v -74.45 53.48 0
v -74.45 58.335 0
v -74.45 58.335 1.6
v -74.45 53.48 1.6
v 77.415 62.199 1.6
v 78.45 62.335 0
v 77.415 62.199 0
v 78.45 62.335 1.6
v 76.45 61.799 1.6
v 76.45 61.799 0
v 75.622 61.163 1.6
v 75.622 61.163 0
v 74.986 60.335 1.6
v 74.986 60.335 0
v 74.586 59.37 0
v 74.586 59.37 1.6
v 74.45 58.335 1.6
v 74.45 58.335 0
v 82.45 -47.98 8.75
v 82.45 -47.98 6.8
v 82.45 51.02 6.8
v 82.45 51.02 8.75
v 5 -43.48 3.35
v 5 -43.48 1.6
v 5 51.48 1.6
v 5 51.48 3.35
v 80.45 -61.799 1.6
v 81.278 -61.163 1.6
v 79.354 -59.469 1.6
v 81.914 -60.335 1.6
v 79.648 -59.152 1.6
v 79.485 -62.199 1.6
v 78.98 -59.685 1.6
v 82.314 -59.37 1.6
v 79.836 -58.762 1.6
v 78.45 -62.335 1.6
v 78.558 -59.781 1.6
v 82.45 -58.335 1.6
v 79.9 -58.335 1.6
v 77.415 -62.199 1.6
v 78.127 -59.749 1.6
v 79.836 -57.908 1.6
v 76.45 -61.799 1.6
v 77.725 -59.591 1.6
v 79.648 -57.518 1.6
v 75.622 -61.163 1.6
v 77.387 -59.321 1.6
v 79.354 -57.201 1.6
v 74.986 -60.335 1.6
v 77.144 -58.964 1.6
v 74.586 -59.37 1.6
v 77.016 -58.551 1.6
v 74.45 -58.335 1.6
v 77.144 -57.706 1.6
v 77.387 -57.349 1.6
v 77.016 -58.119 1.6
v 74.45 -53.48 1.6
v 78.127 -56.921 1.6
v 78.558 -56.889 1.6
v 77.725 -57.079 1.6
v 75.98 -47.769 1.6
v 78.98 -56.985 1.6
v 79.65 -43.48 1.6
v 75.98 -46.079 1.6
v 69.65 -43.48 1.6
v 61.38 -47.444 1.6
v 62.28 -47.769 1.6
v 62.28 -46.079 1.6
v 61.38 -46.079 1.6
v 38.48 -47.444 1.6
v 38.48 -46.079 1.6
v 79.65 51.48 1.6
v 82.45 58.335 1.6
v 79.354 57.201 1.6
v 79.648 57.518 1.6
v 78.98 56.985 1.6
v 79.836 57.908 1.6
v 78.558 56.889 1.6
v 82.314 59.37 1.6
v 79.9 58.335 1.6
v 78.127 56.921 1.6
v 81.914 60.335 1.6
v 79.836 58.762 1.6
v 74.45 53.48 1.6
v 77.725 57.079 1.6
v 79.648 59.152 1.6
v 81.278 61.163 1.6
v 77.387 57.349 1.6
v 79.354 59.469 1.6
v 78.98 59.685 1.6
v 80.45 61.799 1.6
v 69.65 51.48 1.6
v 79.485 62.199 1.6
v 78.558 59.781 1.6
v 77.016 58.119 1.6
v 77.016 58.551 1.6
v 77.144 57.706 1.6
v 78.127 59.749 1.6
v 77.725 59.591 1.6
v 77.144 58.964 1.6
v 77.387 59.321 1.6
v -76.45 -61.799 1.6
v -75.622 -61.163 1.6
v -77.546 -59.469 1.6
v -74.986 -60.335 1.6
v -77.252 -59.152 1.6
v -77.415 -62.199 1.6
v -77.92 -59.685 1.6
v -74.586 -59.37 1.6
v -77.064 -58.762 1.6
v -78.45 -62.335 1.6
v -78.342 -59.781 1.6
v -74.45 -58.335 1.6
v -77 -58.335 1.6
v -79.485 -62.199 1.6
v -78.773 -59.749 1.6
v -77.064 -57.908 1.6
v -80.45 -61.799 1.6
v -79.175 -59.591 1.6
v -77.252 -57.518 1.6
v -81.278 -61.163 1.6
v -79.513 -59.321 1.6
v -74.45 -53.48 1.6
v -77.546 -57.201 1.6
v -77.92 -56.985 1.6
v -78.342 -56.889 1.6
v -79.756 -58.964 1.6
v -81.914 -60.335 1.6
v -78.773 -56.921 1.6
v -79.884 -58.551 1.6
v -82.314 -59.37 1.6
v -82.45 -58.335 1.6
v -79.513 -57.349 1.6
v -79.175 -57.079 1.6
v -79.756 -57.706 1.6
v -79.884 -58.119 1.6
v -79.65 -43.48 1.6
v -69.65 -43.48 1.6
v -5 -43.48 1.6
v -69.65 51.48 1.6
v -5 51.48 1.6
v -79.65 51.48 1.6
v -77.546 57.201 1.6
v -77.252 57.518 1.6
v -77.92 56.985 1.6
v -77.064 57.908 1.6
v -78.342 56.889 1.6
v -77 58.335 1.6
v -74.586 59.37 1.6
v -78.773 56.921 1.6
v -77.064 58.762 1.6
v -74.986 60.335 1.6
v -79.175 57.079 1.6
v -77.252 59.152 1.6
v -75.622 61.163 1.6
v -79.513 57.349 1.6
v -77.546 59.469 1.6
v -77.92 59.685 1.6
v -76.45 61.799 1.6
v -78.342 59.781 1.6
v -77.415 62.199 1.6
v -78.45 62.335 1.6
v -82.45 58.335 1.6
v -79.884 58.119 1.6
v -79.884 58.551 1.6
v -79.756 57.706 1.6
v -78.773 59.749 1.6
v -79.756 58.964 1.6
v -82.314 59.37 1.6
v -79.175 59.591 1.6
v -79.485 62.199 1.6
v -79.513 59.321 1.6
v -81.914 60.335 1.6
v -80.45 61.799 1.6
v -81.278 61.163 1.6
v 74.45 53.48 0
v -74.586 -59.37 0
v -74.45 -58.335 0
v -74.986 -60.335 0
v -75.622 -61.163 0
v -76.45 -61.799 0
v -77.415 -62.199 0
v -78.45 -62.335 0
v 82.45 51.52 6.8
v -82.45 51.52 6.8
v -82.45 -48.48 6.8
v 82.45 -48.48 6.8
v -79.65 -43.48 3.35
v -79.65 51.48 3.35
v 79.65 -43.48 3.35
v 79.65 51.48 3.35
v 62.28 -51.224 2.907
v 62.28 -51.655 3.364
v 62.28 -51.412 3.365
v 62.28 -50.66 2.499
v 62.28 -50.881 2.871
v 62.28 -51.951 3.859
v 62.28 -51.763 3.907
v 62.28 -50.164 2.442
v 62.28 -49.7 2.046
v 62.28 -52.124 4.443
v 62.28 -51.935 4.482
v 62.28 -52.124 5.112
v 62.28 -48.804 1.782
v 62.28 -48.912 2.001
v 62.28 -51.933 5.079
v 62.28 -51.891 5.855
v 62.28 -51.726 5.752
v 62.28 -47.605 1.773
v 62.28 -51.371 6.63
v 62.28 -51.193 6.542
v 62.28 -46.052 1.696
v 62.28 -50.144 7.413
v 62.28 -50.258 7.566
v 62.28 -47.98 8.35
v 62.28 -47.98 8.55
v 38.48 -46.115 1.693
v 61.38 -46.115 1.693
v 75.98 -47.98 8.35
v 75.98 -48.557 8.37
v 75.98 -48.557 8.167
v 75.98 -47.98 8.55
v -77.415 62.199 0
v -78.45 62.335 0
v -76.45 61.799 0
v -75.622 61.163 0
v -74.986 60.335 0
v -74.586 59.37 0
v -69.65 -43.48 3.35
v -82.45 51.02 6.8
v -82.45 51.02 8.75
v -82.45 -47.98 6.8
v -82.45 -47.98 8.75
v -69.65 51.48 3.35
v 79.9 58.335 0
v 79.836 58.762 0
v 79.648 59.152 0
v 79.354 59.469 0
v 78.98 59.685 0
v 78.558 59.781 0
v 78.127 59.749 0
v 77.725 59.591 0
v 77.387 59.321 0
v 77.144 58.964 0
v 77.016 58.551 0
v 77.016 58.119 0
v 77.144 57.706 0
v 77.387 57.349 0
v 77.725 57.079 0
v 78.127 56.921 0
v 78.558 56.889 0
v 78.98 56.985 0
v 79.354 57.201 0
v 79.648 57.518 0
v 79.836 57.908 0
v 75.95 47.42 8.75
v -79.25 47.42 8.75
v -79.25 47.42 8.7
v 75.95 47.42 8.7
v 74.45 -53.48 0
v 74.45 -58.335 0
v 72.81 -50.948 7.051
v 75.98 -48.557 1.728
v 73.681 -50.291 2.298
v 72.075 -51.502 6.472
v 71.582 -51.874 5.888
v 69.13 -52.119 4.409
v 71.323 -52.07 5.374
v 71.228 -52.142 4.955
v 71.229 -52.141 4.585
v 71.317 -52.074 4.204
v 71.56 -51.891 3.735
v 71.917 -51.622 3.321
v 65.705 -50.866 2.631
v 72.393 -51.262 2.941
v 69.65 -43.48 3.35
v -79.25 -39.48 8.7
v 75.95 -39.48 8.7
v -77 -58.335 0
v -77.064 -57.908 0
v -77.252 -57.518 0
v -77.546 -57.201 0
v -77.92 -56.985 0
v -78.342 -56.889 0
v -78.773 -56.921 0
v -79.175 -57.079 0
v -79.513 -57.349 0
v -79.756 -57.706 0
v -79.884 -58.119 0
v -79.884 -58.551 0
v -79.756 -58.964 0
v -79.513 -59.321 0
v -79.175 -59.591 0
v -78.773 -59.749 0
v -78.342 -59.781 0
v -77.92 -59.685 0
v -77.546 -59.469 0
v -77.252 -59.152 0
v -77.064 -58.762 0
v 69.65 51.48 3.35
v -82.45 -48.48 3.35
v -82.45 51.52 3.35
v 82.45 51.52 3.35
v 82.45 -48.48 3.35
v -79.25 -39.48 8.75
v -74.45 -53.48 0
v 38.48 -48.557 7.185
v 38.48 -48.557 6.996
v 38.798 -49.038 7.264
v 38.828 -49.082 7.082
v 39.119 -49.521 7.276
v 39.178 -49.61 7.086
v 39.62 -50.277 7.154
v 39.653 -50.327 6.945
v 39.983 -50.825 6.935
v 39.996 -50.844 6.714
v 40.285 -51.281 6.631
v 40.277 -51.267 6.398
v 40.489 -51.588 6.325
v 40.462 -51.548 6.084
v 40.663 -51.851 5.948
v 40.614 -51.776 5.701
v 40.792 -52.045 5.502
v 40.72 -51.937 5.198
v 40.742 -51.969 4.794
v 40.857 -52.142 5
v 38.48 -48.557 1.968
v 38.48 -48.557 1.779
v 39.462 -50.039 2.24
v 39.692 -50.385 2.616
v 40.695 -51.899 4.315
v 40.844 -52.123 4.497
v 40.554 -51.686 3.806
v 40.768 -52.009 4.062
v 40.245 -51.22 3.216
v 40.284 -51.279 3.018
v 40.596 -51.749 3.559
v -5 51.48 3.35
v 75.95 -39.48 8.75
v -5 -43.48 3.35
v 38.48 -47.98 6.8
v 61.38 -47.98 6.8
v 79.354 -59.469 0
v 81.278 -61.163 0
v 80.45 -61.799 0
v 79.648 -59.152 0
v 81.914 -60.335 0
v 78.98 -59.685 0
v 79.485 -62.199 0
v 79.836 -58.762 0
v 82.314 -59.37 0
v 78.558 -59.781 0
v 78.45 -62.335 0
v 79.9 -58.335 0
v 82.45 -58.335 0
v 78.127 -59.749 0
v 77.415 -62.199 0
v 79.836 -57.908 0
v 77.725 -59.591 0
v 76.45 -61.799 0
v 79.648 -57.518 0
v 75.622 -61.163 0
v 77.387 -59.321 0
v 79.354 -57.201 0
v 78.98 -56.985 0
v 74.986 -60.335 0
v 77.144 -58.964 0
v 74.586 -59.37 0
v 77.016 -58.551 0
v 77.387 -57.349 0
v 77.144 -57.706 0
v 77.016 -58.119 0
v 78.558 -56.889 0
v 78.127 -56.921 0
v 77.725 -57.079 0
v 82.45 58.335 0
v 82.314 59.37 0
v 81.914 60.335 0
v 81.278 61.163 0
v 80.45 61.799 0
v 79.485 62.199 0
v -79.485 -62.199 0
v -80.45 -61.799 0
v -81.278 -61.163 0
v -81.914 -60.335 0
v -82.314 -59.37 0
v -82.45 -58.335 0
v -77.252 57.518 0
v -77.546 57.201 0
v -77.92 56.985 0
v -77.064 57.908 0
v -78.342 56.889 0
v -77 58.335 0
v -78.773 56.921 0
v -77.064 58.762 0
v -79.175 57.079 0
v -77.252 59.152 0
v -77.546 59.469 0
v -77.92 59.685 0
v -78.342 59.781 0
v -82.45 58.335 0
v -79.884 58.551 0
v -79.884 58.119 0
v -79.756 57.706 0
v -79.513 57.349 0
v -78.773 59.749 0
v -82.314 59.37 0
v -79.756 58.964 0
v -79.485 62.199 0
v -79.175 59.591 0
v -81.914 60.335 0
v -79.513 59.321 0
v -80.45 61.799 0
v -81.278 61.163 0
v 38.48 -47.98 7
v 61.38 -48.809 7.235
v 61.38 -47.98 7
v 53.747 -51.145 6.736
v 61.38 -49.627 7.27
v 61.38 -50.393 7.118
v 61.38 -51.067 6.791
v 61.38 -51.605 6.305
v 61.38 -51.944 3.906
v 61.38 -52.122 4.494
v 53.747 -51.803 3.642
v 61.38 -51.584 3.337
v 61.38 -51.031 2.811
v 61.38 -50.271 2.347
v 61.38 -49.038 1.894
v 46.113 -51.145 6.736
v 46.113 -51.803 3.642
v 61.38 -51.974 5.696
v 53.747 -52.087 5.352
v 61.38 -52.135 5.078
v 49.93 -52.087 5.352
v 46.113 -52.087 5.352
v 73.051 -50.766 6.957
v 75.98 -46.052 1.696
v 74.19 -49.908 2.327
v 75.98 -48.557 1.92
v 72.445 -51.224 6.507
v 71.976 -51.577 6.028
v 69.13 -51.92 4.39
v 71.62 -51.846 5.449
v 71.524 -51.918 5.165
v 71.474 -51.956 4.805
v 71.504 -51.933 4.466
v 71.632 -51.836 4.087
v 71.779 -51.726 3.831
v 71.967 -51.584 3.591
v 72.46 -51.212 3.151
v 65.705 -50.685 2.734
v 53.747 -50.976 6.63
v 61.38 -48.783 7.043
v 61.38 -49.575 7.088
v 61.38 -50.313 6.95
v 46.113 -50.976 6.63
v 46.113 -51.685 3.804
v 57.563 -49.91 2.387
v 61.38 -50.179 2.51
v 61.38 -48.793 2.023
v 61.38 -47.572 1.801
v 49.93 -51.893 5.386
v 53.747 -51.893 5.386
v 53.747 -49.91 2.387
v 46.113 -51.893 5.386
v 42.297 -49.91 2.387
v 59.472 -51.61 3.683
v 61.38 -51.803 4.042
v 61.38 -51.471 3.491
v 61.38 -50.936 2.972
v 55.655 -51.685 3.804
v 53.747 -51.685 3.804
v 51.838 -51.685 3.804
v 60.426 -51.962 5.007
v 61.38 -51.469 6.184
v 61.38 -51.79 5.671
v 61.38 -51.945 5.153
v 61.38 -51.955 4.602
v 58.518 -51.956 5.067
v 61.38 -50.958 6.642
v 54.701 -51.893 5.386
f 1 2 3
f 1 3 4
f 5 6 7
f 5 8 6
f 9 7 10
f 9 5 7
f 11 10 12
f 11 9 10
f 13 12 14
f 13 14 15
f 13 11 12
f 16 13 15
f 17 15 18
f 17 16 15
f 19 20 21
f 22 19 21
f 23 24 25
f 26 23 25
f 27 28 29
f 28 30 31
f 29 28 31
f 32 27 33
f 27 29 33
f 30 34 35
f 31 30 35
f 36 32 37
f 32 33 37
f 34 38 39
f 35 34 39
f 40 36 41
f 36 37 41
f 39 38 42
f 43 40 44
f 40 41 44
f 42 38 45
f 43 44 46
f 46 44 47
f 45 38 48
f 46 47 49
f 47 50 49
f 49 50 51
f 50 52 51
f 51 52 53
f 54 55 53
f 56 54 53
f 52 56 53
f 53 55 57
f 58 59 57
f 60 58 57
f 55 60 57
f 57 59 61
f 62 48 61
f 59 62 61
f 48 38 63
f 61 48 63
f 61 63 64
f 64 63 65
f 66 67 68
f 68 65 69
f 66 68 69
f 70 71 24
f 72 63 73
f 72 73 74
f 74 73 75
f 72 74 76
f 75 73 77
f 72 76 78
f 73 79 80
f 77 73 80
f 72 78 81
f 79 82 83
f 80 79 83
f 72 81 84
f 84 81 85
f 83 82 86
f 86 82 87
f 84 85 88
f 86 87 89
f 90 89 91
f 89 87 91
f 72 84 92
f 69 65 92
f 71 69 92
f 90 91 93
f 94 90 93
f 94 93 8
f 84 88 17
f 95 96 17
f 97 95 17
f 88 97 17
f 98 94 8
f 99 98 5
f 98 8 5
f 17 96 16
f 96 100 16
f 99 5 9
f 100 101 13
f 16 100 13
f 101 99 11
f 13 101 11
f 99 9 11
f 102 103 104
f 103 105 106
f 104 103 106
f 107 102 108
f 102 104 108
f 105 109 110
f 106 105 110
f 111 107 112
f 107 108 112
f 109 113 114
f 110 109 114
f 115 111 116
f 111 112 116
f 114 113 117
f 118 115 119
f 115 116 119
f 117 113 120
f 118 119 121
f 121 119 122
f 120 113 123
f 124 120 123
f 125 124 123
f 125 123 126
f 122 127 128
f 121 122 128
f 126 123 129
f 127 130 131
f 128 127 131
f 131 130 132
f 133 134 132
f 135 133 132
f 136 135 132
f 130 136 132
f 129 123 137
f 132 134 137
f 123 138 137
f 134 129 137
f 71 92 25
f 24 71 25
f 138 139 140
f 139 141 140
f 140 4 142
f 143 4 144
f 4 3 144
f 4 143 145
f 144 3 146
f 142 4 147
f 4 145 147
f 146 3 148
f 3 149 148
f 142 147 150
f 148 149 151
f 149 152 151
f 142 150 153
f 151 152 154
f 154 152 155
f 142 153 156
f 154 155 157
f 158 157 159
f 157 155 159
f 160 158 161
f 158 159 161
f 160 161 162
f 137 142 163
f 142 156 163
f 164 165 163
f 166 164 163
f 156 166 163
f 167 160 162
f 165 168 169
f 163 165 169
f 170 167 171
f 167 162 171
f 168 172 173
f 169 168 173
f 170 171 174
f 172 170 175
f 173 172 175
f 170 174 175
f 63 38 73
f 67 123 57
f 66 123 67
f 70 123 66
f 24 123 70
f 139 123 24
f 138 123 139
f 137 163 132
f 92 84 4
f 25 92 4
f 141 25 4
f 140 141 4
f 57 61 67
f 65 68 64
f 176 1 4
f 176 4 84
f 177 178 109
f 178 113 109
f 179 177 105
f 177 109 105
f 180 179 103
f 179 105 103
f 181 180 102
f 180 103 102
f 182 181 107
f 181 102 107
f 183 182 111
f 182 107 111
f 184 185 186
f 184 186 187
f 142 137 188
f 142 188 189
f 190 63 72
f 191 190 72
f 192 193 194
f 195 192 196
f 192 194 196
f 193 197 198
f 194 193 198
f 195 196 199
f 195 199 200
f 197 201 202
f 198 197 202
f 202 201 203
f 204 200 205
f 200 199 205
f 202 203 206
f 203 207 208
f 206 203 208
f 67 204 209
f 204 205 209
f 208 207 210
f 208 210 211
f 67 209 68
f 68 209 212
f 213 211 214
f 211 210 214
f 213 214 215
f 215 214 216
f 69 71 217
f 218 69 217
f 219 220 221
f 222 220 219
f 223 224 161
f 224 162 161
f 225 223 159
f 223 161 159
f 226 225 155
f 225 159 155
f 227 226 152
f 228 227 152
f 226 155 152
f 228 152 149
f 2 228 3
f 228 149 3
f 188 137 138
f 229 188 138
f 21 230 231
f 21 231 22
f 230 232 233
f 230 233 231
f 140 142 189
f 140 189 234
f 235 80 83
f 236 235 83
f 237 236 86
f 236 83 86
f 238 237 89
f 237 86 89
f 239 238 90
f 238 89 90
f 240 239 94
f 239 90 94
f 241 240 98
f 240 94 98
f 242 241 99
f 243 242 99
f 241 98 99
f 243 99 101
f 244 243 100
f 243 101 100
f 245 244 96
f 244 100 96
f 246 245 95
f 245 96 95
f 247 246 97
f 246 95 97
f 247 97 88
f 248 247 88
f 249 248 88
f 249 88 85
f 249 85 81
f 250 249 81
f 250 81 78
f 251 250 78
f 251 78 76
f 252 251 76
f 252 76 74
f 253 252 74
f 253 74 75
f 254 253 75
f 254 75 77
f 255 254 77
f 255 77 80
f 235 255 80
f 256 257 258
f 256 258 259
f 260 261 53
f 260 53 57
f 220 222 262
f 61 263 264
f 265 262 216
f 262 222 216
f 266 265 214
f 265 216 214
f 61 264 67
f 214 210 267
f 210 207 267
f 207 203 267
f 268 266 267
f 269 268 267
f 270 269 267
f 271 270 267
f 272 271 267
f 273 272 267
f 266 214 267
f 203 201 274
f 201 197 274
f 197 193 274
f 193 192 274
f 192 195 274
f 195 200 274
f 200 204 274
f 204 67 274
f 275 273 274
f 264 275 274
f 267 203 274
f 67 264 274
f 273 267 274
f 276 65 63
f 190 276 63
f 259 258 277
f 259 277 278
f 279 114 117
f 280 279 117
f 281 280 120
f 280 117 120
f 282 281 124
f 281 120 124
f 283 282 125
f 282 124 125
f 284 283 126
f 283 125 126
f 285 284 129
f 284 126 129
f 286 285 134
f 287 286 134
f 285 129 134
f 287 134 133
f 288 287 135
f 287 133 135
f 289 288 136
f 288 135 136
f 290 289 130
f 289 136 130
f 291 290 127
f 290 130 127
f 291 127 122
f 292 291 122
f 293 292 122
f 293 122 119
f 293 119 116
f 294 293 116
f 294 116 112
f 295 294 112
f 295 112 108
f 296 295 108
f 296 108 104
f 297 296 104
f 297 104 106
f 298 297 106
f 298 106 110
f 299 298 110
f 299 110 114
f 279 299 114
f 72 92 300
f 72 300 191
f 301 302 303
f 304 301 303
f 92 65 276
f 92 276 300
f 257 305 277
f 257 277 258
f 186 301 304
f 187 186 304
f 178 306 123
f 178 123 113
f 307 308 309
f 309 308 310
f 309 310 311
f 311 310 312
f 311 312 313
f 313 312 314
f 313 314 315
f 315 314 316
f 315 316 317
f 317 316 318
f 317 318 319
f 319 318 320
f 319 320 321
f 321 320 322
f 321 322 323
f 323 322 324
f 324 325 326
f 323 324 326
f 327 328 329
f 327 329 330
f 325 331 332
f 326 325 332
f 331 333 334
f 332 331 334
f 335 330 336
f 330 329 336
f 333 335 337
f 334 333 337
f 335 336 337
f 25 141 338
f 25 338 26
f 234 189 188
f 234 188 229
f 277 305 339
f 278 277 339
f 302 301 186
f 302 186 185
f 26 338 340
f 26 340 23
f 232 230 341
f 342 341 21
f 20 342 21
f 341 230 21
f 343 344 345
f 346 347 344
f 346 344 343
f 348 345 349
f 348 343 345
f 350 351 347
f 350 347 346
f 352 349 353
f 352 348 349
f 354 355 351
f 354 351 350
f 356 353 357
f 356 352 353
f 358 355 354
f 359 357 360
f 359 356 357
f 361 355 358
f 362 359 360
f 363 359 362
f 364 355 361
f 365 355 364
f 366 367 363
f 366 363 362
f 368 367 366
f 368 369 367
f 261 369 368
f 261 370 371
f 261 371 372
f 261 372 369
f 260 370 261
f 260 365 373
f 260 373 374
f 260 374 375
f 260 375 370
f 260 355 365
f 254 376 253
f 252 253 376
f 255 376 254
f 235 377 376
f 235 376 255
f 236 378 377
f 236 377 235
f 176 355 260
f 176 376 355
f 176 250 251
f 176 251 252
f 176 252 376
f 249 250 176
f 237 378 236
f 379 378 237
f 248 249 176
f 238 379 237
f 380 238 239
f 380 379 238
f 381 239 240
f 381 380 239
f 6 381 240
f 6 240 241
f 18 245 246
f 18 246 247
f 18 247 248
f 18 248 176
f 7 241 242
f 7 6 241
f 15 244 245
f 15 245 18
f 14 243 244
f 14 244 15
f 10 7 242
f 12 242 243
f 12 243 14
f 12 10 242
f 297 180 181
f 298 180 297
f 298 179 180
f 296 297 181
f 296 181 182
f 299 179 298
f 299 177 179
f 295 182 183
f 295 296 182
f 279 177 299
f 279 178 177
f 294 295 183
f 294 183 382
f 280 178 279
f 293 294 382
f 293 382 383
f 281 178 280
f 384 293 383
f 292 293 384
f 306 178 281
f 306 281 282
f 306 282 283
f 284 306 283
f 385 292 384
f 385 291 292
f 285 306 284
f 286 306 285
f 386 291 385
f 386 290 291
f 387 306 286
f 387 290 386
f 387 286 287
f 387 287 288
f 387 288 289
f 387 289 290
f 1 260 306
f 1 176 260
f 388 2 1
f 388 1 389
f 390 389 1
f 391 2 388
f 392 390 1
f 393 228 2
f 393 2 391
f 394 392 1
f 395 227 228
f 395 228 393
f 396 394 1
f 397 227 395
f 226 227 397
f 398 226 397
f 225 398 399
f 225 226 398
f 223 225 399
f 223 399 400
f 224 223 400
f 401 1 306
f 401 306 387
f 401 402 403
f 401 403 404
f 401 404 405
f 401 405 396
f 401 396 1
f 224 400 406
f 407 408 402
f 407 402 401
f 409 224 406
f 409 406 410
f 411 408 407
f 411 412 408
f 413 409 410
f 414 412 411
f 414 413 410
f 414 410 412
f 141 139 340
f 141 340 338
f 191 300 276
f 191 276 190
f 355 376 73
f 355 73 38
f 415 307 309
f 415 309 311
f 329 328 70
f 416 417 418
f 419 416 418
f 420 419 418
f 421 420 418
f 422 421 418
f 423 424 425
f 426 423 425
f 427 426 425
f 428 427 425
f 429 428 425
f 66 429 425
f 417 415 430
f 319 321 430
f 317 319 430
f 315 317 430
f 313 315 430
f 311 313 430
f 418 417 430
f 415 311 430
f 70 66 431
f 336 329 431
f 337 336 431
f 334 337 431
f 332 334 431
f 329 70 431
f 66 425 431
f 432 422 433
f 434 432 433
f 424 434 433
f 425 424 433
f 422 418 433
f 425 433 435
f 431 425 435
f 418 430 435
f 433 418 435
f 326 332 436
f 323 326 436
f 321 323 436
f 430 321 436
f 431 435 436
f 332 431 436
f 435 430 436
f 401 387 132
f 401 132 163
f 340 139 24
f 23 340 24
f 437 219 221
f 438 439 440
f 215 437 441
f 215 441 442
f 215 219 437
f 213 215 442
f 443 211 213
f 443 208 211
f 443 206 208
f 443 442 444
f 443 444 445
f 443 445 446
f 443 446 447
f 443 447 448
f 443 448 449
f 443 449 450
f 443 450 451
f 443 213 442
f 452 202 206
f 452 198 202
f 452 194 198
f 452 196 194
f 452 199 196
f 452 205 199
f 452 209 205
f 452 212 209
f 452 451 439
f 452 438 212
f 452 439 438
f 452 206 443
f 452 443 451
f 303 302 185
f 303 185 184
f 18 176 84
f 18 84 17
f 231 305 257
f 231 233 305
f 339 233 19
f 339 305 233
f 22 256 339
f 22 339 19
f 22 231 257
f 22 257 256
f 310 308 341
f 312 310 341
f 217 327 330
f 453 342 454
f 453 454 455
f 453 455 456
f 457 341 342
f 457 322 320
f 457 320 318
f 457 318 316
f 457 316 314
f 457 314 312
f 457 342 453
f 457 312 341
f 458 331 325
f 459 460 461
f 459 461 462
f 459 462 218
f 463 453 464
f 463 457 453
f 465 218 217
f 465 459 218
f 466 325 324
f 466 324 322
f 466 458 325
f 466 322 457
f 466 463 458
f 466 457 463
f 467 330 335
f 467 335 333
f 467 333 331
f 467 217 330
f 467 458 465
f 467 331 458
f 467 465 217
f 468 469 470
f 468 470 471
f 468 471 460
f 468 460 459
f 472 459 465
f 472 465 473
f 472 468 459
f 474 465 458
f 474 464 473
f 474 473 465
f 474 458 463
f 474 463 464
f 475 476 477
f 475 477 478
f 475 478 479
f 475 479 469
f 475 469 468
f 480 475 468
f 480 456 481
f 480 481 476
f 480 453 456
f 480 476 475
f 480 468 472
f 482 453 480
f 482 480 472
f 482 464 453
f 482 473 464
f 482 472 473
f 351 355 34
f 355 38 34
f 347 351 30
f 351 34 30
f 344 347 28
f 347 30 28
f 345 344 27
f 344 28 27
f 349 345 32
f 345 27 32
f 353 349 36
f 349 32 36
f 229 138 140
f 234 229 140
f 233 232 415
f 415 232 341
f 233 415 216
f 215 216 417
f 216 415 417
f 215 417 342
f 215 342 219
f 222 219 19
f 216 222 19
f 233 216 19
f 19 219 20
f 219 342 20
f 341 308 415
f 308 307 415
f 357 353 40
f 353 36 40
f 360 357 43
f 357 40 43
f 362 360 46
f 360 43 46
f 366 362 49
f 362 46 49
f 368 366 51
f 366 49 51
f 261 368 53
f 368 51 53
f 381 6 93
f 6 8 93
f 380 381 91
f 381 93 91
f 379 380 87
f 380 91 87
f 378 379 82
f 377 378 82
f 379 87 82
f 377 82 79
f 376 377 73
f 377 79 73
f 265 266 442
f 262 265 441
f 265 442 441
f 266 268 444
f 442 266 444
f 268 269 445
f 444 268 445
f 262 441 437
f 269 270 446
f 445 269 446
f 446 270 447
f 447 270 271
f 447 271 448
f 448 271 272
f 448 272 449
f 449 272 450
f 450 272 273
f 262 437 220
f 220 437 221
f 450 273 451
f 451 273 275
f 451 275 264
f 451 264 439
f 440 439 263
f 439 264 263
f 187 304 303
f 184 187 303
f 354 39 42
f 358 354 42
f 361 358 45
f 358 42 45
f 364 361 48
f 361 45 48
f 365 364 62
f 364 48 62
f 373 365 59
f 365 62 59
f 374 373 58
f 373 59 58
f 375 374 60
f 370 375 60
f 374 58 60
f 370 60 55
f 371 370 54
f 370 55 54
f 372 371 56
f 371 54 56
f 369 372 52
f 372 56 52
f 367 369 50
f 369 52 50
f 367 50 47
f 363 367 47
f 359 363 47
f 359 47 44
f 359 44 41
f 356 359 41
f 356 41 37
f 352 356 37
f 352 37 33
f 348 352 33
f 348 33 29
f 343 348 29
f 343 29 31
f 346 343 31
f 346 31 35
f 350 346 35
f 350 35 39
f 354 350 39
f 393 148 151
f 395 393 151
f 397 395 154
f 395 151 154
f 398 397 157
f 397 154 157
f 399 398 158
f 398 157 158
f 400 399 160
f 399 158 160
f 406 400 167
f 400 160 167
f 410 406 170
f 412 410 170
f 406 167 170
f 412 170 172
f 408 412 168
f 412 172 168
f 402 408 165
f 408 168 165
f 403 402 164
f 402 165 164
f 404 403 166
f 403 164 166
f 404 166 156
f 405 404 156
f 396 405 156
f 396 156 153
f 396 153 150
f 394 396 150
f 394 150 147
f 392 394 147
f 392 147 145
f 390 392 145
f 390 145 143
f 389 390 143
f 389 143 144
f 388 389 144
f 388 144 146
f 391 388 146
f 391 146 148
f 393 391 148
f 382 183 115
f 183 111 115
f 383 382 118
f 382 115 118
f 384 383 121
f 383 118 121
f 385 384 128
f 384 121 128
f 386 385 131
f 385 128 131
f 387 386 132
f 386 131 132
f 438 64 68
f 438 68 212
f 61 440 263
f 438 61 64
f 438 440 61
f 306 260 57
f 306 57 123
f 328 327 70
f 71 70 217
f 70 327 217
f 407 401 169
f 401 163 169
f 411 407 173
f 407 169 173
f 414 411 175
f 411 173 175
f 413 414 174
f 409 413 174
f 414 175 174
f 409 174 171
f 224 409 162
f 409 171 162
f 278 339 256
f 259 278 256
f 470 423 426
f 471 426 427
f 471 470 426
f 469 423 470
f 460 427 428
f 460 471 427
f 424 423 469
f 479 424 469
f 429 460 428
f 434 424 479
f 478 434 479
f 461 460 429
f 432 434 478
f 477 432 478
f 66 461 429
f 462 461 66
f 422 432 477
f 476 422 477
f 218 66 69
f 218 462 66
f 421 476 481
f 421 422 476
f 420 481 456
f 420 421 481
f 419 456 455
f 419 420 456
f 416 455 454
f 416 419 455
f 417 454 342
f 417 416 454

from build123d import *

# Parameters (mm, degrees)
PCBA_DEPTH         = 1.6
FILLET1_R          = 4
SKETCH2_R          = 1.45
SCREWHOLE_DEPTH    = 104.374149211
SKETCH5_W          = 10
SKETCH5_H          = 94.96
TAPE_DEPTH         = 1.75
SKETCH6_W          = 164.9
SKETCH6_H          = 100
BACKLIGHT_DEPTH    = 3.45
SKETCH7_W          = 164.9
SKETCH7_H          = 99
LCDNTOUCH_DEPTH    = 1.95
SWEEP1_START       = 62.28
SWEEP1_DEPTH       = 13.7
SWEEP2_START       = 38.48
SWEEP2_DEPTH       = 22.9
CUT_EXTRUDE3_DEPTH = 31.65
SKETCH16_W         = 155.2
SKETCH16_H         = 86.9
CUT_EXTRUDE4_DEPTH = 0.05


# Read off the part's stored shape, not the designer's step: Sweep1, Sweep2
with BuildPart() as part:
    # Sketch1 → PCBA (new body)
    with BuildSketch(Plane.XY):
        Polygon((74.45, 62.335), (82.45, 62.335), (82.45, -62.335), (74.45, -62.335), (74.45, -53.48), (-74.45, -53.48), (-74.45, -62.335), (-82.45, -62.335), (-82.45, 62.335), (-74.45, 62.335), (-74.45, 53.48), (74.45, 53.48), align=None)
    extrude(amount=PCBA_DEPTH)

    # Fillet1
    fillet1_edges = [part.edges().sort_by_distance(p)[0] for p in [
        (-82.45, 62.335, 0.8),
        (-74.45, 62.335, 0.8),
        (-82.45, -62.335, 0.8),
        (-74.45, -62.335, 0.8),
        (74.45, -62.335, 0.8),
        (82.45, -62.335, 0.8),
        (74.45, 62.335, 0.8),
        (82.45, 62.335, 0.8),
    ]]
    fillet(fillet1_edges, radius=FILLET1_R - 0.0001)  # a hair under: the kernel refuses the full size

    # Sketch2 → ScrewHole (cut, through all)
    with BuildSketch(Plane.XY.offset(1.6)):
        with Locations((-78.45, 58.335)):
            Circle(SKETCH2_R)
        with Locations((78.45, 58.335)):
            Circle(SKETCH2_R)
        with Locations((78.45, -58.335)):
            Circle(SKETCH2_R)
        with Locations((-78.45, -58.335)):
            Circle(SKETCH2_R)
    extrude(amount=-SCREWHOLE_DEPTH, mode=Mode.SUBTRACT)

    # Sketch5 → Tape (add)
    with BuildSketch(Plane.XY.offset(1.6)):
        with Locations((-74.65, 4)):
            Rectangle(SKETCH5_W, SKETCH5_H)
        with Locations((74.65, 4)):
            Rectangle(SKETCH5_W, SKETCH5_H)
        with Locations((0, 4)):
            Rectangle(SKETCH5_W, SKETCH5_H)
    extrude(amount=TAPE_DEPTH)



with BuildPart() as body_2:
    # Sketch6 → Backlight (new body)
    with BuildSketch(Plane.XY.offset(3.35)):
        with Locations((0, 1.52)):
            Rectangle(SKETCH6_W, SKETCH6_H)
    extrude(amount=BACKLIGHT_DEPTH)


with BuildPart() as body_3:
    # Sketch7 → LCDnTouch (new body)
    with BuildSketch(Plane.XY.offset(6.8)):
        with Locations((0, 1.52)):
            Rectangle(SKETCH7_W, SKETCH7_H)
    extrude(amount=LCDNTOUCH_DEPTH)


with BuildPart() as part_1:
    add(part.part)

    add(body_3.part)  # Sweep1 merges body 3
    # Sweep1 outline → Sweep1 (add)
    with BuildSketch(Plane.YZ.offset(SWEEP1_START)):
        with BuildLine():
            Line((-47.98, 8.35), (-47.98, 8.55))
            add(Edge.make_bspline(
                [(-47.98, 8.55), (-50.912403456, 7.72848927), (-52.382208971, 5.990192913), (-51.897184373, 3.081064394), (-50.448425543, 1.931894606), (-47.768774159, 1.6)],
                knots=[0, 0, 0, 0, 0.5, 0.5, 0.920075321, 0.920075321, 0.920075321, 0.920075321], degree=3))
            Line((-47.768774159, 1.6), (-46.078575055, 1.6))
            Line((-46.078575055, 1.6), (-46.051588588, 1.696289826))
            add(Edge.make_bspline(
                [(-47.98, 8.35), (-50.882100743, 7.521222553), (-52.197429111, 5.825675212), (-51.641753238, 2.953709182), (-49.776101832, 1.681049132), (-46.051588588, 1.696289826)],
                knots=[0, 0, 0, 0, 0.5, 0.5, 1, 1, 1, 1], degree=3))
        make_face()
    extrude(amount=SWEEP1_DEPTH)

    # Sweep2 outline → Sweep2 (add)
    with BuildSketch(Plane.YZ.offset(SWEEP2_START)):
        with BuildLine():
            Line((-47.98, 6.8), (-47.98, 7))
            add(Edge.make_bspline(
                [(-47.98, 7), (-49.110675347, 7.46570031), (-50.32572409, 7.329976113), (-52.089641205, 6.051762932), (-52.492002459, 4.760357324), (-51.217904856, 2.693421448), (-49.870436377, 1.875208104), (-47.443985346, 1.6)],
                knots=[0, 0, 0, 0, 0.302586662, 0.302586662, 0.651293331, 0.651293331, 0.947252102, 0.947252102, 0.947252102, 0.947252102], degree=3))
            Line((-47.443985346, 1.6), (-46.078575055, 1.6))
            Line((-46.078575055, 1.6), (-46.115156248, 1.69306888))
            add(Edge.make_bspline(
                [(-47.98, 6.8), (-49.048242707, 7.266417976), (-50.197952574, 7.156968521), (-51.871711427, 6.023186847), (-52.290428411, 4.86054287), (-51.078664372, 2.746662369), (-49.41521941, 1.78739192), (-46.115156248, 1.69306888)],
                knots=[0, 0, 0, 0, 0.302586662, 0.302586662, 0.651293331, 0.651293331, 1, 1, 1, 1], degree=3))
        make_face()
    extrude(amount=SWEEP2_DEPTH)

    # Sketch15 → Cut-Extrude3 (cut)
    with BuildSketch(Plane.XY.offset(1.6)):
        Polygon((38.48, -48.557400222), (40.98, -52.328343488), (70.98, -52.328343488), (75.98, -48.557400222), (75.98, -53.138786489), (38.248743189, -53.138786489), (38.248743189, -48.557400222), align=None)
    extrude(amount=CUT_EXTRUDE3_DEPTH, mode=Mode.SUBTRACT)

    # Sketch16 → Cut-Extrude4 (cut)
    with BuildSketch(Plane.XY.offset(8.75)):
        with Locations((-1.65, 3.97)):
            Rectangle(SKETCH16_W, SKETCH16_H)
    extrude(amount=-CUT_EXTRUDE4_DEPTH, mode=Mode.SUBTRACT)


solid = Compound([body_2.part, part_1.part])
